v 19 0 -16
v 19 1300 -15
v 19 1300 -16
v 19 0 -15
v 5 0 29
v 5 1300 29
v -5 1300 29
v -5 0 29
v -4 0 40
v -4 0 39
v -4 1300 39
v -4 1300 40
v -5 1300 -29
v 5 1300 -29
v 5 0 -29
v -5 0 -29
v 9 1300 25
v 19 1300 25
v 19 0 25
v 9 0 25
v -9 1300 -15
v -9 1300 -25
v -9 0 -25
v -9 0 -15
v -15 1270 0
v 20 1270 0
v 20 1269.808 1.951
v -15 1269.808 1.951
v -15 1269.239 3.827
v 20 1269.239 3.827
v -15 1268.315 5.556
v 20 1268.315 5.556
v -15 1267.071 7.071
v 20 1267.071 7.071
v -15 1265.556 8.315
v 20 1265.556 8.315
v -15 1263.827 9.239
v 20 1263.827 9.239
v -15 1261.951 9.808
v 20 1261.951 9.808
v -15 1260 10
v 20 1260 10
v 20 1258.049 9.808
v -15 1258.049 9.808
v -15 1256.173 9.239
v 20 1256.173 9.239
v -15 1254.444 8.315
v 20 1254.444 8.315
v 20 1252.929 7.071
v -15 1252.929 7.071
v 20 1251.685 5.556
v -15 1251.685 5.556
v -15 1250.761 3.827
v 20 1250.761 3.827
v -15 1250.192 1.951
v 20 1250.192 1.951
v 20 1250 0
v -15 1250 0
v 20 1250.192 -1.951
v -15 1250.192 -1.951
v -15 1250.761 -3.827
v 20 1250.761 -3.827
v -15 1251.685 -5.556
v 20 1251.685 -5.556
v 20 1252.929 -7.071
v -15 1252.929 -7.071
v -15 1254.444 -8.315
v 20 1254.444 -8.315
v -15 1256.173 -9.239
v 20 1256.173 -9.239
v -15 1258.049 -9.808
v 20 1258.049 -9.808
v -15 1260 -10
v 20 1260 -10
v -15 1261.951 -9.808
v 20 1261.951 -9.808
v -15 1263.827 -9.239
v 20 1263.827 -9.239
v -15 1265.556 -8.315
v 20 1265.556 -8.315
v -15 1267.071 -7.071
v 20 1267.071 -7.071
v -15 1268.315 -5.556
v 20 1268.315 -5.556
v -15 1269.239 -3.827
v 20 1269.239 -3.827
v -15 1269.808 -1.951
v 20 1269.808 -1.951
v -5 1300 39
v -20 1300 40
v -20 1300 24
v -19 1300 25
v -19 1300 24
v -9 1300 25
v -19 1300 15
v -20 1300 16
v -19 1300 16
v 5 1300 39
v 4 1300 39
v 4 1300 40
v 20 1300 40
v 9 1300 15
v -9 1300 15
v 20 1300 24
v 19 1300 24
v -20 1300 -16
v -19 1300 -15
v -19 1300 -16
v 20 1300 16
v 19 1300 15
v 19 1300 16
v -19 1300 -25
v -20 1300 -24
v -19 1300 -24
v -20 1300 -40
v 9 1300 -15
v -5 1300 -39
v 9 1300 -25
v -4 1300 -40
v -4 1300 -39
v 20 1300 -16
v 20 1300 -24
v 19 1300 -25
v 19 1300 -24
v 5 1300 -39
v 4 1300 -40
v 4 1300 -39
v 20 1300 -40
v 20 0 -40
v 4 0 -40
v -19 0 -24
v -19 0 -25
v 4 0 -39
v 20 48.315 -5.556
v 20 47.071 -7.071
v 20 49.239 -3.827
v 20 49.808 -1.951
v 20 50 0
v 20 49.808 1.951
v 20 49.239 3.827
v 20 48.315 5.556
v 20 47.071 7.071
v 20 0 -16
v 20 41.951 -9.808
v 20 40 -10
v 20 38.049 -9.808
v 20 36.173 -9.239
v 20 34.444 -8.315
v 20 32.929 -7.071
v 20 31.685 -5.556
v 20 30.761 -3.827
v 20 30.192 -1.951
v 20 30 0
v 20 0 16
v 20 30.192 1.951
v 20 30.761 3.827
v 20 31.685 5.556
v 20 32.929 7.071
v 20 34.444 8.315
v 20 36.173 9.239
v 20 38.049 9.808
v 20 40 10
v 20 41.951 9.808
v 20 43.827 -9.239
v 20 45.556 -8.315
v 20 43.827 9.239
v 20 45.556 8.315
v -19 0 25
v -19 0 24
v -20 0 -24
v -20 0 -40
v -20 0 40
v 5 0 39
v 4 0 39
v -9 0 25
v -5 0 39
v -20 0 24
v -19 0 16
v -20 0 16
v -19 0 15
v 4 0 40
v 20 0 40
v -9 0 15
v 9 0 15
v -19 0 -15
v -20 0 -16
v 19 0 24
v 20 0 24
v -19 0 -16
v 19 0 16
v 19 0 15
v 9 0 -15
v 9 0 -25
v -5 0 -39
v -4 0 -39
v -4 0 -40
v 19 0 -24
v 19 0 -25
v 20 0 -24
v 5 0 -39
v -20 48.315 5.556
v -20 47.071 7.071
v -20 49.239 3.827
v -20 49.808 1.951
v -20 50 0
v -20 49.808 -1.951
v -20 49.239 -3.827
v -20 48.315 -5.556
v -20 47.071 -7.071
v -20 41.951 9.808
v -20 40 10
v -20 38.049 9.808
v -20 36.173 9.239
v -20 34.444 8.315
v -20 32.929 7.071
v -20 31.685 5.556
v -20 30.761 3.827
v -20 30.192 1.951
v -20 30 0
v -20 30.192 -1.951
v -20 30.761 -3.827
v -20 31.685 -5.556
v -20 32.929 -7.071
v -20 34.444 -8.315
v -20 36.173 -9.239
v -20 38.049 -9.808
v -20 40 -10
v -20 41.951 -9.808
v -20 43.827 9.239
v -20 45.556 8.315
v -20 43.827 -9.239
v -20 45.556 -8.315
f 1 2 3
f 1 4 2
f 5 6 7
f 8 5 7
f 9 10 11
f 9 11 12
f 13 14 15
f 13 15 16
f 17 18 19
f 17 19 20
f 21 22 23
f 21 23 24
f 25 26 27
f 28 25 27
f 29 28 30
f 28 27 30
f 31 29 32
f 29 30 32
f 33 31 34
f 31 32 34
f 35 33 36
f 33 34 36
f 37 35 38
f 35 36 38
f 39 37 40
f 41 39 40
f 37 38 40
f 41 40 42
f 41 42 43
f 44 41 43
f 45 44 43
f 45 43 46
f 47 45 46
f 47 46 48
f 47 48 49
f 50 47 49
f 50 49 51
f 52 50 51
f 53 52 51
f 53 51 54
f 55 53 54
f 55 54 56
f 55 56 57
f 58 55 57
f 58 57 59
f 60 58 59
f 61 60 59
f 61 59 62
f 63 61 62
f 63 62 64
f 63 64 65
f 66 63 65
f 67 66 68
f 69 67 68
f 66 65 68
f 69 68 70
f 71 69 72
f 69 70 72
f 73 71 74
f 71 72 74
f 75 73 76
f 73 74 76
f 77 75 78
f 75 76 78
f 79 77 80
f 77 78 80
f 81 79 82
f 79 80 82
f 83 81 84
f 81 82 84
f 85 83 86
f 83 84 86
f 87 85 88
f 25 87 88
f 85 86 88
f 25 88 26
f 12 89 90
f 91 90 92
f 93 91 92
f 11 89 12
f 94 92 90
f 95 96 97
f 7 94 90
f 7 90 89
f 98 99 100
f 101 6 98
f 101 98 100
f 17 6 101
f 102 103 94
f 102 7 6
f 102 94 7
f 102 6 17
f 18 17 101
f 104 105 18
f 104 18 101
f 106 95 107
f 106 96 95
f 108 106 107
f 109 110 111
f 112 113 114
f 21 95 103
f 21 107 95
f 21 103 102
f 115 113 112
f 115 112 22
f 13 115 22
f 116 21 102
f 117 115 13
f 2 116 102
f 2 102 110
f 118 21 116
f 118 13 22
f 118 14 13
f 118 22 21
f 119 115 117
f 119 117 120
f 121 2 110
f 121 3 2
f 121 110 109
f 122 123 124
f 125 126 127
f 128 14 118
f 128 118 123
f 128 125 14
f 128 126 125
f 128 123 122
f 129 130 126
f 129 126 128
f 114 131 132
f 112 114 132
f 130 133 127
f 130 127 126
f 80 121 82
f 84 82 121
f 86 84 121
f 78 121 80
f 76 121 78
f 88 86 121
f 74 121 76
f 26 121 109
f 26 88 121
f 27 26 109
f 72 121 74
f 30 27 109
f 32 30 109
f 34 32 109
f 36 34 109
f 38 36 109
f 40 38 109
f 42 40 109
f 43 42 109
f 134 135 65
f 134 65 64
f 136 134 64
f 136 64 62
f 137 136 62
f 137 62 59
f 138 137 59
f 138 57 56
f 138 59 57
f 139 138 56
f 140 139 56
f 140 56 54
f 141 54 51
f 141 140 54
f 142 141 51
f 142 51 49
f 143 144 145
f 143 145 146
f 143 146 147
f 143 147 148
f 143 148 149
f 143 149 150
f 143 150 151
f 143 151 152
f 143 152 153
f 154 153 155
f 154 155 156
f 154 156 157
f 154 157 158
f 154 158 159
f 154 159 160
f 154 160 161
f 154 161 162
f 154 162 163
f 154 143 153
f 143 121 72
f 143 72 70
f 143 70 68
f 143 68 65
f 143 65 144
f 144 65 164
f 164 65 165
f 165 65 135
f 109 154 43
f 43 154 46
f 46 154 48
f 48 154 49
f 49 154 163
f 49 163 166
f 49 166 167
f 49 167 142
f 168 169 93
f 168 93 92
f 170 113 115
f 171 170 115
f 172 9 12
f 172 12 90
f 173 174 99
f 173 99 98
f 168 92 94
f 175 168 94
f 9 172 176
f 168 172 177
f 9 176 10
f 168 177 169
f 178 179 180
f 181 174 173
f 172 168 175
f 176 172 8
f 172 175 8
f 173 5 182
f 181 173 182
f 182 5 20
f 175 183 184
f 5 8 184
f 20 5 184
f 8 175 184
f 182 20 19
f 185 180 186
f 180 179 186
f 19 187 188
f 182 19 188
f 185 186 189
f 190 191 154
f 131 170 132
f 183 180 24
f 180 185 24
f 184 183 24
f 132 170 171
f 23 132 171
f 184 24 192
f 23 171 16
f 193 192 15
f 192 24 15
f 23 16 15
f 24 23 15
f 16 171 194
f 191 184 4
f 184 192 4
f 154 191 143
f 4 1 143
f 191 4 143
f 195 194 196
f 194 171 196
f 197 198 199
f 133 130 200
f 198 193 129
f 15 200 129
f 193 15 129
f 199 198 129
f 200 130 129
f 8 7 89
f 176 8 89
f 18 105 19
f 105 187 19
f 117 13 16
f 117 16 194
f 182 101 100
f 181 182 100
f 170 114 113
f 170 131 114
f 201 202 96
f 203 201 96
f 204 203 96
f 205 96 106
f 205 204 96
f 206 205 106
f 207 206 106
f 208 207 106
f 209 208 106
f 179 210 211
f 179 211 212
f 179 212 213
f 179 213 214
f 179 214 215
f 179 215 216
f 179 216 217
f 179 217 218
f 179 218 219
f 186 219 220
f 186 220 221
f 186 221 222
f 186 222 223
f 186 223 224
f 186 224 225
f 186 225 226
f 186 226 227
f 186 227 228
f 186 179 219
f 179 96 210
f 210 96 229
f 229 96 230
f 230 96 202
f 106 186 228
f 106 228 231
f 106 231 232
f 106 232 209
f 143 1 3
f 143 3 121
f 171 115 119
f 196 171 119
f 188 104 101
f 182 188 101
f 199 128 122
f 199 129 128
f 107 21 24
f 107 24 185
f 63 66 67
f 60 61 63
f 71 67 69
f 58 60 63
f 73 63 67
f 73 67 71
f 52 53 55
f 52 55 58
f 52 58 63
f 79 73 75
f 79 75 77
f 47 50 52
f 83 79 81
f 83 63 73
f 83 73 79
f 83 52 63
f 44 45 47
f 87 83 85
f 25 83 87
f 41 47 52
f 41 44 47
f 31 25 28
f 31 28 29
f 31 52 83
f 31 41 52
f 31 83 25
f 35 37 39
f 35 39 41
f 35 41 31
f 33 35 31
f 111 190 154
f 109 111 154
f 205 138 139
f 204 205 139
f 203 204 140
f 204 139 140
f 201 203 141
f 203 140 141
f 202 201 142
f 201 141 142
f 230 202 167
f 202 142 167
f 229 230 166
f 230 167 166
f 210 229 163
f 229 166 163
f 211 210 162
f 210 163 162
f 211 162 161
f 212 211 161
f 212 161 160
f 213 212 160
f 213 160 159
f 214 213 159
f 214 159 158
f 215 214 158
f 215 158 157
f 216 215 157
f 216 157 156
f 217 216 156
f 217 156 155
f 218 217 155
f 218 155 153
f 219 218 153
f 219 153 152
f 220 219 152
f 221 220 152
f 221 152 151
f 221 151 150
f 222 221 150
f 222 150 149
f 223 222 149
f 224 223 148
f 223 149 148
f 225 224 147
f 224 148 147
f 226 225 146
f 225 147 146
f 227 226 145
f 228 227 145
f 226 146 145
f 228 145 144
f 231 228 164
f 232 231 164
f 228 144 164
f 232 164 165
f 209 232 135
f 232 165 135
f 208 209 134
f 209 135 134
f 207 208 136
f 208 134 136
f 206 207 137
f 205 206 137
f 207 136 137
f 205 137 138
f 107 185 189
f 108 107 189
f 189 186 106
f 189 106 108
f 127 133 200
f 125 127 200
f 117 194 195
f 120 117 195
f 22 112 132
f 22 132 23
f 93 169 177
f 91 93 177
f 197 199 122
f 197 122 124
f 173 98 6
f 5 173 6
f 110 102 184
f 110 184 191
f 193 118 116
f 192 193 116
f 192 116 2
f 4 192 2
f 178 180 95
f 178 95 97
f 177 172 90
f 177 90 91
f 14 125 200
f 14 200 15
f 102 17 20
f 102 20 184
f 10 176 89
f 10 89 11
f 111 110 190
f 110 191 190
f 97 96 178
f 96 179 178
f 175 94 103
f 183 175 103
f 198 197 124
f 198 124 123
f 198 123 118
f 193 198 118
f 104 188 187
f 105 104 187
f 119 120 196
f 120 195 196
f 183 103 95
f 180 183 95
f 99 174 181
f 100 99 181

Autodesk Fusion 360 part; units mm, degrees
sketch "Sketch1" plane through (0, 0, 0) normal (0, 1, 0) x (1, 0, 0)
  line L0 (20, -40) -> (-20, 40) construction
  line L1 (-20, -40) -> (20, 40) construction
  line L2 (5, 29) -> (-5, 29)
  line L3 (-5, 29) -> (-5, 39)
  line L4 (5, 39) -> (5, 29)
  line L5 (5, 29) -> (-5, 39) construction
  line L6 (-5, 29) -> (5, 39) construction
  line L7 (-4, 39) -> (-4, 40)
  line L8 (4, 39) -> (4, 40)
  line L9 (-19, 25) -> (-9, 25)
  line L10 (-9, 25) -> (-9, 15)
  line L11 (-9, 15) -> (-19, 15)
  line L12 (19, 25) -> (9, 25)
  line L13 (9, 25) -> (9, 15)
  line L14 (9, 15) -> (19, 15)
  line L15 (-20, 16) -> (-19, 16)
  line L16 (-19, 24) -> (-20, 24)
  line L17 (19, 16) -> (20, 16)
  line L18 (20, 24) -> (19, 24)
  line L19 (-20, 24) -> (-20, 40)
  line L20 (-19, 15) -> (-19, 16)
  line L21 (-19, 24) -> (-19, 25)
  line L22 (19, 15) -> (19, 16)
  line L23 (19, 24) -> (19, 25)
  line L24 (-20, 40) -> (-4, 40)
  line L25 (4, 40) -> (20, 40)
  line L26 (-5, 39) -> (-4, 39)
  line L27 (4, 39) -> (5, 39)
  line L28 (20, 40) -> (20, 24)
  line L29 (1.75, 0) -> (22.5, 0)
  line L30 (-19, -24) -> (-20, -24)
  line L31 (-19, -24) -> (-19, -25)
  line L32 (-19, -25) -> (-9, -25)
  line L33 (-20, -16) -> (-19, -16)
  line L34 (-19, -15) -> (-19, -16)
  line L35 (-9, -15) -> (-19, -15)
  line L36 (-9, -25) -> (-9, -15)
  line L37 (-4, -39) -> (-4, -40)
  line L38 (-5, -39) -> (-4, -39)
  line L39 (-5, -29) -> (-5, -39)
  line L40 (5, -29) -> (-5, -29)
  line L41 (5, -39) -> (5, -29)
  line L42 (4, -39) -> (5, -39)
  line L43 (4, -39) -> (4, -40)
  line L44 (20, -24) -> (19, -24)
  line L45 (19, -24) -> (19, -25)
  line L46 (19, -25) -> (9, -25)
  line L47 (9, -25) -> (9, -15)
  line L48 (9, -15) -> (19, -15)
  line L49 (19, -15) -> (19, -16)
  line L50 (19, -16) -> (20, -16)
  line L51 (-20, -40) -> (-20, -24)
  line L52 (-20, -16) -> (-20, 16)
  line L53 (20, 16) -> (20, -16)
  line L54 (20, -24) -> (20, -40)
  line L55 (20, -40) -> (4, -40)
  line L56 (-4, -40) -> (-20, -40)
  point P0 (0, 34)
  dimension "d20" = 40
  dimension "d21" = 80
  dimension "d22" = 10
  dimension "d23" = 10
  dimension "d24" = 20
  dimension "d25" = 16
  dimension "d26" = 16
  dimension "d27" = 1
  dimension "d28" = 15
  dimension "d29" = 15
  dimension "d30" = 10
  dimension "d31" = 10
  dimension "d32" = 10
  dimension "d33" = 10
  dimension "d34" = 16
  dimension "d35" = 8
  dimension "d36" = 1
  dimension "d37" = 16
  dimension "d38" = 8
  dimension "d39" = 1
extrude "Extrude1" add sketch "Sketch1" along normal blind 1300
sketch "Sketch2" plane through (20, 0, 0) normal (1, 0, 0) x (0, 1, 0)
  line L0 (0, 16) -> (0, -16)
  line L1 (0, -16) -> (1300, -16)
  line L2 (1300, -16) -> (1300, 16)
  line L3 (1300, 16) -> (0, 16)
  circle A0 centre (40, 0) radius 10
  circle A1 centre (1260, 0) radius 10
  dimension "d42" = 20
  dimension "d45" = 20
  dimension "d48" = 40
  dimension "d49" = 40
extrude "Extrude2" cut sketch "Sketch2" against normal blind 40 contours A0
extrude "Extrude3" cut sketch "Sketch2" against normal blind 35 contours A1
